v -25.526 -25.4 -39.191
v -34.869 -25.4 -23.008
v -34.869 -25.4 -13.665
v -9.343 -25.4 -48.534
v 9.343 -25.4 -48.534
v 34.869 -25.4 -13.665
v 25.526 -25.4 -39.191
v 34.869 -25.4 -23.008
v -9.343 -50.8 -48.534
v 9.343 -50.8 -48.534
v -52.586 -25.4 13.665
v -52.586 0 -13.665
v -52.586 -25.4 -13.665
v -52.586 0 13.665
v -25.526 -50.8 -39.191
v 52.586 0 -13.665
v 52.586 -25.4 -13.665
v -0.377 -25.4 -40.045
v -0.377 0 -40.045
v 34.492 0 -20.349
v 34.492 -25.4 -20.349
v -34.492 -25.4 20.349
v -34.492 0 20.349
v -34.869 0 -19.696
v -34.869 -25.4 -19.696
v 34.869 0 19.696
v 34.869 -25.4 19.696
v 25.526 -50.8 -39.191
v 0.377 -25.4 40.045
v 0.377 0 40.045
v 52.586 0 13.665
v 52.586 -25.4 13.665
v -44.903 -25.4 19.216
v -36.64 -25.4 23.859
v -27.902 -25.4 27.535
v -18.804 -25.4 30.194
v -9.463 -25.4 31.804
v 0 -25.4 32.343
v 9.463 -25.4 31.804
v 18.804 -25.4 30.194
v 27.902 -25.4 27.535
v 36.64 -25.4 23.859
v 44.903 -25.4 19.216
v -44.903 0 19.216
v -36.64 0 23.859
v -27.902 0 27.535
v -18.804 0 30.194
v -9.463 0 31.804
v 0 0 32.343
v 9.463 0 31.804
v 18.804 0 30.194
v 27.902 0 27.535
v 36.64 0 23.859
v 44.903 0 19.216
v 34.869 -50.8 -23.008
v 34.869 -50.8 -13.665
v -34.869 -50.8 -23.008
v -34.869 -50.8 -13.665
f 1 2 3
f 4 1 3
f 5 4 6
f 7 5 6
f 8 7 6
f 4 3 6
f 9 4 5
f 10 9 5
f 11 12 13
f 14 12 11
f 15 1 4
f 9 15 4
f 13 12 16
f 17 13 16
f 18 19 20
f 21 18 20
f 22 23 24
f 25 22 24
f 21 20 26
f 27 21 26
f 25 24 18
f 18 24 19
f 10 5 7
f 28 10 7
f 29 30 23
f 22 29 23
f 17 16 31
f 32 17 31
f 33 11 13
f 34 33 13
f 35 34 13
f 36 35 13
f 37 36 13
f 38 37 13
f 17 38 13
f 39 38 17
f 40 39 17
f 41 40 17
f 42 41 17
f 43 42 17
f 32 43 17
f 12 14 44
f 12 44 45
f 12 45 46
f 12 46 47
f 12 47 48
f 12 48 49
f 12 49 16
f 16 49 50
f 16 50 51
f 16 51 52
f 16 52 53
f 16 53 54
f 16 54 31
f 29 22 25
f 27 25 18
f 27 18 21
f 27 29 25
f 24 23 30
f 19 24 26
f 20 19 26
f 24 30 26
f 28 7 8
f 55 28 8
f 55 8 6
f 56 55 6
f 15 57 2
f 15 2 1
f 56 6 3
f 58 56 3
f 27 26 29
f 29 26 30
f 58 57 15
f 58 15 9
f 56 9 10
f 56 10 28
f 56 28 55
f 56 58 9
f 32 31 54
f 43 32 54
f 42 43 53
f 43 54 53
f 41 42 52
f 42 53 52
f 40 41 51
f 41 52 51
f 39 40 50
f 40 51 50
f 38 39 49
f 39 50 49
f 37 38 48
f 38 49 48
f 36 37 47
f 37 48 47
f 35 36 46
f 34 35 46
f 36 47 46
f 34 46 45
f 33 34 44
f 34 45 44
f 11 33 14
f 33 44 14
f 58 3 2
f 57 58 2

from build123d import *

# Parameters (mm, degrees)
F0_W     = 105.172158
F0_H     = 27.329684
F1_DEPTH = 25.4
F3_DEPTH = 25.4
F5_DEPTH = 25.4


with BuildPart() as f1:
    # F0 (on Front) → F1 (new body)
    with BuildSketch(Plane.XZ):
        Rectangle(F0_W, F0_H)
        with BuildLine():
            Line((-52.586079, 13.664842), (52.586079, 13.664842))
            ThreePointArc((52.586079, 13.664842), (0, 32.342827), (-52.586079, 13.664842))
        make_face()
    extrude(amount=F1_DEPTH)


with BuildPart() as f3:
    # F2 (on face) → F3 (new body)
    with BuildSketch(Plane.XZ.offset(25.4)):
        Polygon((-9.343094, -48.533744), (9.343094, -48.533744), (25.525808, -39.19065), (34.868903, -23.007936), (34.868903, -13.664842), (-34.868903, -13.664842), (-34.868903, -23.007936), (-25.525808, -39.19065), align=None)
    extrude(amount=F3_DEPTH)


with BuildPart() as f5:
    # F4 (on Front) → F5 (new body)
    with BuildSketch(Plane.XZ):
        Polygon((-34.491878, 20.349247), (-34.868903, -19.696219), (-0.377026, -40.045466), (34.491878, -20.349247), (34.868903, 19.696219), (0.377026, 40.045466), align=None)
    extrude(amount=F5_DEPTH)


solid = Compound([f1.part, f3.part, f5.part])
